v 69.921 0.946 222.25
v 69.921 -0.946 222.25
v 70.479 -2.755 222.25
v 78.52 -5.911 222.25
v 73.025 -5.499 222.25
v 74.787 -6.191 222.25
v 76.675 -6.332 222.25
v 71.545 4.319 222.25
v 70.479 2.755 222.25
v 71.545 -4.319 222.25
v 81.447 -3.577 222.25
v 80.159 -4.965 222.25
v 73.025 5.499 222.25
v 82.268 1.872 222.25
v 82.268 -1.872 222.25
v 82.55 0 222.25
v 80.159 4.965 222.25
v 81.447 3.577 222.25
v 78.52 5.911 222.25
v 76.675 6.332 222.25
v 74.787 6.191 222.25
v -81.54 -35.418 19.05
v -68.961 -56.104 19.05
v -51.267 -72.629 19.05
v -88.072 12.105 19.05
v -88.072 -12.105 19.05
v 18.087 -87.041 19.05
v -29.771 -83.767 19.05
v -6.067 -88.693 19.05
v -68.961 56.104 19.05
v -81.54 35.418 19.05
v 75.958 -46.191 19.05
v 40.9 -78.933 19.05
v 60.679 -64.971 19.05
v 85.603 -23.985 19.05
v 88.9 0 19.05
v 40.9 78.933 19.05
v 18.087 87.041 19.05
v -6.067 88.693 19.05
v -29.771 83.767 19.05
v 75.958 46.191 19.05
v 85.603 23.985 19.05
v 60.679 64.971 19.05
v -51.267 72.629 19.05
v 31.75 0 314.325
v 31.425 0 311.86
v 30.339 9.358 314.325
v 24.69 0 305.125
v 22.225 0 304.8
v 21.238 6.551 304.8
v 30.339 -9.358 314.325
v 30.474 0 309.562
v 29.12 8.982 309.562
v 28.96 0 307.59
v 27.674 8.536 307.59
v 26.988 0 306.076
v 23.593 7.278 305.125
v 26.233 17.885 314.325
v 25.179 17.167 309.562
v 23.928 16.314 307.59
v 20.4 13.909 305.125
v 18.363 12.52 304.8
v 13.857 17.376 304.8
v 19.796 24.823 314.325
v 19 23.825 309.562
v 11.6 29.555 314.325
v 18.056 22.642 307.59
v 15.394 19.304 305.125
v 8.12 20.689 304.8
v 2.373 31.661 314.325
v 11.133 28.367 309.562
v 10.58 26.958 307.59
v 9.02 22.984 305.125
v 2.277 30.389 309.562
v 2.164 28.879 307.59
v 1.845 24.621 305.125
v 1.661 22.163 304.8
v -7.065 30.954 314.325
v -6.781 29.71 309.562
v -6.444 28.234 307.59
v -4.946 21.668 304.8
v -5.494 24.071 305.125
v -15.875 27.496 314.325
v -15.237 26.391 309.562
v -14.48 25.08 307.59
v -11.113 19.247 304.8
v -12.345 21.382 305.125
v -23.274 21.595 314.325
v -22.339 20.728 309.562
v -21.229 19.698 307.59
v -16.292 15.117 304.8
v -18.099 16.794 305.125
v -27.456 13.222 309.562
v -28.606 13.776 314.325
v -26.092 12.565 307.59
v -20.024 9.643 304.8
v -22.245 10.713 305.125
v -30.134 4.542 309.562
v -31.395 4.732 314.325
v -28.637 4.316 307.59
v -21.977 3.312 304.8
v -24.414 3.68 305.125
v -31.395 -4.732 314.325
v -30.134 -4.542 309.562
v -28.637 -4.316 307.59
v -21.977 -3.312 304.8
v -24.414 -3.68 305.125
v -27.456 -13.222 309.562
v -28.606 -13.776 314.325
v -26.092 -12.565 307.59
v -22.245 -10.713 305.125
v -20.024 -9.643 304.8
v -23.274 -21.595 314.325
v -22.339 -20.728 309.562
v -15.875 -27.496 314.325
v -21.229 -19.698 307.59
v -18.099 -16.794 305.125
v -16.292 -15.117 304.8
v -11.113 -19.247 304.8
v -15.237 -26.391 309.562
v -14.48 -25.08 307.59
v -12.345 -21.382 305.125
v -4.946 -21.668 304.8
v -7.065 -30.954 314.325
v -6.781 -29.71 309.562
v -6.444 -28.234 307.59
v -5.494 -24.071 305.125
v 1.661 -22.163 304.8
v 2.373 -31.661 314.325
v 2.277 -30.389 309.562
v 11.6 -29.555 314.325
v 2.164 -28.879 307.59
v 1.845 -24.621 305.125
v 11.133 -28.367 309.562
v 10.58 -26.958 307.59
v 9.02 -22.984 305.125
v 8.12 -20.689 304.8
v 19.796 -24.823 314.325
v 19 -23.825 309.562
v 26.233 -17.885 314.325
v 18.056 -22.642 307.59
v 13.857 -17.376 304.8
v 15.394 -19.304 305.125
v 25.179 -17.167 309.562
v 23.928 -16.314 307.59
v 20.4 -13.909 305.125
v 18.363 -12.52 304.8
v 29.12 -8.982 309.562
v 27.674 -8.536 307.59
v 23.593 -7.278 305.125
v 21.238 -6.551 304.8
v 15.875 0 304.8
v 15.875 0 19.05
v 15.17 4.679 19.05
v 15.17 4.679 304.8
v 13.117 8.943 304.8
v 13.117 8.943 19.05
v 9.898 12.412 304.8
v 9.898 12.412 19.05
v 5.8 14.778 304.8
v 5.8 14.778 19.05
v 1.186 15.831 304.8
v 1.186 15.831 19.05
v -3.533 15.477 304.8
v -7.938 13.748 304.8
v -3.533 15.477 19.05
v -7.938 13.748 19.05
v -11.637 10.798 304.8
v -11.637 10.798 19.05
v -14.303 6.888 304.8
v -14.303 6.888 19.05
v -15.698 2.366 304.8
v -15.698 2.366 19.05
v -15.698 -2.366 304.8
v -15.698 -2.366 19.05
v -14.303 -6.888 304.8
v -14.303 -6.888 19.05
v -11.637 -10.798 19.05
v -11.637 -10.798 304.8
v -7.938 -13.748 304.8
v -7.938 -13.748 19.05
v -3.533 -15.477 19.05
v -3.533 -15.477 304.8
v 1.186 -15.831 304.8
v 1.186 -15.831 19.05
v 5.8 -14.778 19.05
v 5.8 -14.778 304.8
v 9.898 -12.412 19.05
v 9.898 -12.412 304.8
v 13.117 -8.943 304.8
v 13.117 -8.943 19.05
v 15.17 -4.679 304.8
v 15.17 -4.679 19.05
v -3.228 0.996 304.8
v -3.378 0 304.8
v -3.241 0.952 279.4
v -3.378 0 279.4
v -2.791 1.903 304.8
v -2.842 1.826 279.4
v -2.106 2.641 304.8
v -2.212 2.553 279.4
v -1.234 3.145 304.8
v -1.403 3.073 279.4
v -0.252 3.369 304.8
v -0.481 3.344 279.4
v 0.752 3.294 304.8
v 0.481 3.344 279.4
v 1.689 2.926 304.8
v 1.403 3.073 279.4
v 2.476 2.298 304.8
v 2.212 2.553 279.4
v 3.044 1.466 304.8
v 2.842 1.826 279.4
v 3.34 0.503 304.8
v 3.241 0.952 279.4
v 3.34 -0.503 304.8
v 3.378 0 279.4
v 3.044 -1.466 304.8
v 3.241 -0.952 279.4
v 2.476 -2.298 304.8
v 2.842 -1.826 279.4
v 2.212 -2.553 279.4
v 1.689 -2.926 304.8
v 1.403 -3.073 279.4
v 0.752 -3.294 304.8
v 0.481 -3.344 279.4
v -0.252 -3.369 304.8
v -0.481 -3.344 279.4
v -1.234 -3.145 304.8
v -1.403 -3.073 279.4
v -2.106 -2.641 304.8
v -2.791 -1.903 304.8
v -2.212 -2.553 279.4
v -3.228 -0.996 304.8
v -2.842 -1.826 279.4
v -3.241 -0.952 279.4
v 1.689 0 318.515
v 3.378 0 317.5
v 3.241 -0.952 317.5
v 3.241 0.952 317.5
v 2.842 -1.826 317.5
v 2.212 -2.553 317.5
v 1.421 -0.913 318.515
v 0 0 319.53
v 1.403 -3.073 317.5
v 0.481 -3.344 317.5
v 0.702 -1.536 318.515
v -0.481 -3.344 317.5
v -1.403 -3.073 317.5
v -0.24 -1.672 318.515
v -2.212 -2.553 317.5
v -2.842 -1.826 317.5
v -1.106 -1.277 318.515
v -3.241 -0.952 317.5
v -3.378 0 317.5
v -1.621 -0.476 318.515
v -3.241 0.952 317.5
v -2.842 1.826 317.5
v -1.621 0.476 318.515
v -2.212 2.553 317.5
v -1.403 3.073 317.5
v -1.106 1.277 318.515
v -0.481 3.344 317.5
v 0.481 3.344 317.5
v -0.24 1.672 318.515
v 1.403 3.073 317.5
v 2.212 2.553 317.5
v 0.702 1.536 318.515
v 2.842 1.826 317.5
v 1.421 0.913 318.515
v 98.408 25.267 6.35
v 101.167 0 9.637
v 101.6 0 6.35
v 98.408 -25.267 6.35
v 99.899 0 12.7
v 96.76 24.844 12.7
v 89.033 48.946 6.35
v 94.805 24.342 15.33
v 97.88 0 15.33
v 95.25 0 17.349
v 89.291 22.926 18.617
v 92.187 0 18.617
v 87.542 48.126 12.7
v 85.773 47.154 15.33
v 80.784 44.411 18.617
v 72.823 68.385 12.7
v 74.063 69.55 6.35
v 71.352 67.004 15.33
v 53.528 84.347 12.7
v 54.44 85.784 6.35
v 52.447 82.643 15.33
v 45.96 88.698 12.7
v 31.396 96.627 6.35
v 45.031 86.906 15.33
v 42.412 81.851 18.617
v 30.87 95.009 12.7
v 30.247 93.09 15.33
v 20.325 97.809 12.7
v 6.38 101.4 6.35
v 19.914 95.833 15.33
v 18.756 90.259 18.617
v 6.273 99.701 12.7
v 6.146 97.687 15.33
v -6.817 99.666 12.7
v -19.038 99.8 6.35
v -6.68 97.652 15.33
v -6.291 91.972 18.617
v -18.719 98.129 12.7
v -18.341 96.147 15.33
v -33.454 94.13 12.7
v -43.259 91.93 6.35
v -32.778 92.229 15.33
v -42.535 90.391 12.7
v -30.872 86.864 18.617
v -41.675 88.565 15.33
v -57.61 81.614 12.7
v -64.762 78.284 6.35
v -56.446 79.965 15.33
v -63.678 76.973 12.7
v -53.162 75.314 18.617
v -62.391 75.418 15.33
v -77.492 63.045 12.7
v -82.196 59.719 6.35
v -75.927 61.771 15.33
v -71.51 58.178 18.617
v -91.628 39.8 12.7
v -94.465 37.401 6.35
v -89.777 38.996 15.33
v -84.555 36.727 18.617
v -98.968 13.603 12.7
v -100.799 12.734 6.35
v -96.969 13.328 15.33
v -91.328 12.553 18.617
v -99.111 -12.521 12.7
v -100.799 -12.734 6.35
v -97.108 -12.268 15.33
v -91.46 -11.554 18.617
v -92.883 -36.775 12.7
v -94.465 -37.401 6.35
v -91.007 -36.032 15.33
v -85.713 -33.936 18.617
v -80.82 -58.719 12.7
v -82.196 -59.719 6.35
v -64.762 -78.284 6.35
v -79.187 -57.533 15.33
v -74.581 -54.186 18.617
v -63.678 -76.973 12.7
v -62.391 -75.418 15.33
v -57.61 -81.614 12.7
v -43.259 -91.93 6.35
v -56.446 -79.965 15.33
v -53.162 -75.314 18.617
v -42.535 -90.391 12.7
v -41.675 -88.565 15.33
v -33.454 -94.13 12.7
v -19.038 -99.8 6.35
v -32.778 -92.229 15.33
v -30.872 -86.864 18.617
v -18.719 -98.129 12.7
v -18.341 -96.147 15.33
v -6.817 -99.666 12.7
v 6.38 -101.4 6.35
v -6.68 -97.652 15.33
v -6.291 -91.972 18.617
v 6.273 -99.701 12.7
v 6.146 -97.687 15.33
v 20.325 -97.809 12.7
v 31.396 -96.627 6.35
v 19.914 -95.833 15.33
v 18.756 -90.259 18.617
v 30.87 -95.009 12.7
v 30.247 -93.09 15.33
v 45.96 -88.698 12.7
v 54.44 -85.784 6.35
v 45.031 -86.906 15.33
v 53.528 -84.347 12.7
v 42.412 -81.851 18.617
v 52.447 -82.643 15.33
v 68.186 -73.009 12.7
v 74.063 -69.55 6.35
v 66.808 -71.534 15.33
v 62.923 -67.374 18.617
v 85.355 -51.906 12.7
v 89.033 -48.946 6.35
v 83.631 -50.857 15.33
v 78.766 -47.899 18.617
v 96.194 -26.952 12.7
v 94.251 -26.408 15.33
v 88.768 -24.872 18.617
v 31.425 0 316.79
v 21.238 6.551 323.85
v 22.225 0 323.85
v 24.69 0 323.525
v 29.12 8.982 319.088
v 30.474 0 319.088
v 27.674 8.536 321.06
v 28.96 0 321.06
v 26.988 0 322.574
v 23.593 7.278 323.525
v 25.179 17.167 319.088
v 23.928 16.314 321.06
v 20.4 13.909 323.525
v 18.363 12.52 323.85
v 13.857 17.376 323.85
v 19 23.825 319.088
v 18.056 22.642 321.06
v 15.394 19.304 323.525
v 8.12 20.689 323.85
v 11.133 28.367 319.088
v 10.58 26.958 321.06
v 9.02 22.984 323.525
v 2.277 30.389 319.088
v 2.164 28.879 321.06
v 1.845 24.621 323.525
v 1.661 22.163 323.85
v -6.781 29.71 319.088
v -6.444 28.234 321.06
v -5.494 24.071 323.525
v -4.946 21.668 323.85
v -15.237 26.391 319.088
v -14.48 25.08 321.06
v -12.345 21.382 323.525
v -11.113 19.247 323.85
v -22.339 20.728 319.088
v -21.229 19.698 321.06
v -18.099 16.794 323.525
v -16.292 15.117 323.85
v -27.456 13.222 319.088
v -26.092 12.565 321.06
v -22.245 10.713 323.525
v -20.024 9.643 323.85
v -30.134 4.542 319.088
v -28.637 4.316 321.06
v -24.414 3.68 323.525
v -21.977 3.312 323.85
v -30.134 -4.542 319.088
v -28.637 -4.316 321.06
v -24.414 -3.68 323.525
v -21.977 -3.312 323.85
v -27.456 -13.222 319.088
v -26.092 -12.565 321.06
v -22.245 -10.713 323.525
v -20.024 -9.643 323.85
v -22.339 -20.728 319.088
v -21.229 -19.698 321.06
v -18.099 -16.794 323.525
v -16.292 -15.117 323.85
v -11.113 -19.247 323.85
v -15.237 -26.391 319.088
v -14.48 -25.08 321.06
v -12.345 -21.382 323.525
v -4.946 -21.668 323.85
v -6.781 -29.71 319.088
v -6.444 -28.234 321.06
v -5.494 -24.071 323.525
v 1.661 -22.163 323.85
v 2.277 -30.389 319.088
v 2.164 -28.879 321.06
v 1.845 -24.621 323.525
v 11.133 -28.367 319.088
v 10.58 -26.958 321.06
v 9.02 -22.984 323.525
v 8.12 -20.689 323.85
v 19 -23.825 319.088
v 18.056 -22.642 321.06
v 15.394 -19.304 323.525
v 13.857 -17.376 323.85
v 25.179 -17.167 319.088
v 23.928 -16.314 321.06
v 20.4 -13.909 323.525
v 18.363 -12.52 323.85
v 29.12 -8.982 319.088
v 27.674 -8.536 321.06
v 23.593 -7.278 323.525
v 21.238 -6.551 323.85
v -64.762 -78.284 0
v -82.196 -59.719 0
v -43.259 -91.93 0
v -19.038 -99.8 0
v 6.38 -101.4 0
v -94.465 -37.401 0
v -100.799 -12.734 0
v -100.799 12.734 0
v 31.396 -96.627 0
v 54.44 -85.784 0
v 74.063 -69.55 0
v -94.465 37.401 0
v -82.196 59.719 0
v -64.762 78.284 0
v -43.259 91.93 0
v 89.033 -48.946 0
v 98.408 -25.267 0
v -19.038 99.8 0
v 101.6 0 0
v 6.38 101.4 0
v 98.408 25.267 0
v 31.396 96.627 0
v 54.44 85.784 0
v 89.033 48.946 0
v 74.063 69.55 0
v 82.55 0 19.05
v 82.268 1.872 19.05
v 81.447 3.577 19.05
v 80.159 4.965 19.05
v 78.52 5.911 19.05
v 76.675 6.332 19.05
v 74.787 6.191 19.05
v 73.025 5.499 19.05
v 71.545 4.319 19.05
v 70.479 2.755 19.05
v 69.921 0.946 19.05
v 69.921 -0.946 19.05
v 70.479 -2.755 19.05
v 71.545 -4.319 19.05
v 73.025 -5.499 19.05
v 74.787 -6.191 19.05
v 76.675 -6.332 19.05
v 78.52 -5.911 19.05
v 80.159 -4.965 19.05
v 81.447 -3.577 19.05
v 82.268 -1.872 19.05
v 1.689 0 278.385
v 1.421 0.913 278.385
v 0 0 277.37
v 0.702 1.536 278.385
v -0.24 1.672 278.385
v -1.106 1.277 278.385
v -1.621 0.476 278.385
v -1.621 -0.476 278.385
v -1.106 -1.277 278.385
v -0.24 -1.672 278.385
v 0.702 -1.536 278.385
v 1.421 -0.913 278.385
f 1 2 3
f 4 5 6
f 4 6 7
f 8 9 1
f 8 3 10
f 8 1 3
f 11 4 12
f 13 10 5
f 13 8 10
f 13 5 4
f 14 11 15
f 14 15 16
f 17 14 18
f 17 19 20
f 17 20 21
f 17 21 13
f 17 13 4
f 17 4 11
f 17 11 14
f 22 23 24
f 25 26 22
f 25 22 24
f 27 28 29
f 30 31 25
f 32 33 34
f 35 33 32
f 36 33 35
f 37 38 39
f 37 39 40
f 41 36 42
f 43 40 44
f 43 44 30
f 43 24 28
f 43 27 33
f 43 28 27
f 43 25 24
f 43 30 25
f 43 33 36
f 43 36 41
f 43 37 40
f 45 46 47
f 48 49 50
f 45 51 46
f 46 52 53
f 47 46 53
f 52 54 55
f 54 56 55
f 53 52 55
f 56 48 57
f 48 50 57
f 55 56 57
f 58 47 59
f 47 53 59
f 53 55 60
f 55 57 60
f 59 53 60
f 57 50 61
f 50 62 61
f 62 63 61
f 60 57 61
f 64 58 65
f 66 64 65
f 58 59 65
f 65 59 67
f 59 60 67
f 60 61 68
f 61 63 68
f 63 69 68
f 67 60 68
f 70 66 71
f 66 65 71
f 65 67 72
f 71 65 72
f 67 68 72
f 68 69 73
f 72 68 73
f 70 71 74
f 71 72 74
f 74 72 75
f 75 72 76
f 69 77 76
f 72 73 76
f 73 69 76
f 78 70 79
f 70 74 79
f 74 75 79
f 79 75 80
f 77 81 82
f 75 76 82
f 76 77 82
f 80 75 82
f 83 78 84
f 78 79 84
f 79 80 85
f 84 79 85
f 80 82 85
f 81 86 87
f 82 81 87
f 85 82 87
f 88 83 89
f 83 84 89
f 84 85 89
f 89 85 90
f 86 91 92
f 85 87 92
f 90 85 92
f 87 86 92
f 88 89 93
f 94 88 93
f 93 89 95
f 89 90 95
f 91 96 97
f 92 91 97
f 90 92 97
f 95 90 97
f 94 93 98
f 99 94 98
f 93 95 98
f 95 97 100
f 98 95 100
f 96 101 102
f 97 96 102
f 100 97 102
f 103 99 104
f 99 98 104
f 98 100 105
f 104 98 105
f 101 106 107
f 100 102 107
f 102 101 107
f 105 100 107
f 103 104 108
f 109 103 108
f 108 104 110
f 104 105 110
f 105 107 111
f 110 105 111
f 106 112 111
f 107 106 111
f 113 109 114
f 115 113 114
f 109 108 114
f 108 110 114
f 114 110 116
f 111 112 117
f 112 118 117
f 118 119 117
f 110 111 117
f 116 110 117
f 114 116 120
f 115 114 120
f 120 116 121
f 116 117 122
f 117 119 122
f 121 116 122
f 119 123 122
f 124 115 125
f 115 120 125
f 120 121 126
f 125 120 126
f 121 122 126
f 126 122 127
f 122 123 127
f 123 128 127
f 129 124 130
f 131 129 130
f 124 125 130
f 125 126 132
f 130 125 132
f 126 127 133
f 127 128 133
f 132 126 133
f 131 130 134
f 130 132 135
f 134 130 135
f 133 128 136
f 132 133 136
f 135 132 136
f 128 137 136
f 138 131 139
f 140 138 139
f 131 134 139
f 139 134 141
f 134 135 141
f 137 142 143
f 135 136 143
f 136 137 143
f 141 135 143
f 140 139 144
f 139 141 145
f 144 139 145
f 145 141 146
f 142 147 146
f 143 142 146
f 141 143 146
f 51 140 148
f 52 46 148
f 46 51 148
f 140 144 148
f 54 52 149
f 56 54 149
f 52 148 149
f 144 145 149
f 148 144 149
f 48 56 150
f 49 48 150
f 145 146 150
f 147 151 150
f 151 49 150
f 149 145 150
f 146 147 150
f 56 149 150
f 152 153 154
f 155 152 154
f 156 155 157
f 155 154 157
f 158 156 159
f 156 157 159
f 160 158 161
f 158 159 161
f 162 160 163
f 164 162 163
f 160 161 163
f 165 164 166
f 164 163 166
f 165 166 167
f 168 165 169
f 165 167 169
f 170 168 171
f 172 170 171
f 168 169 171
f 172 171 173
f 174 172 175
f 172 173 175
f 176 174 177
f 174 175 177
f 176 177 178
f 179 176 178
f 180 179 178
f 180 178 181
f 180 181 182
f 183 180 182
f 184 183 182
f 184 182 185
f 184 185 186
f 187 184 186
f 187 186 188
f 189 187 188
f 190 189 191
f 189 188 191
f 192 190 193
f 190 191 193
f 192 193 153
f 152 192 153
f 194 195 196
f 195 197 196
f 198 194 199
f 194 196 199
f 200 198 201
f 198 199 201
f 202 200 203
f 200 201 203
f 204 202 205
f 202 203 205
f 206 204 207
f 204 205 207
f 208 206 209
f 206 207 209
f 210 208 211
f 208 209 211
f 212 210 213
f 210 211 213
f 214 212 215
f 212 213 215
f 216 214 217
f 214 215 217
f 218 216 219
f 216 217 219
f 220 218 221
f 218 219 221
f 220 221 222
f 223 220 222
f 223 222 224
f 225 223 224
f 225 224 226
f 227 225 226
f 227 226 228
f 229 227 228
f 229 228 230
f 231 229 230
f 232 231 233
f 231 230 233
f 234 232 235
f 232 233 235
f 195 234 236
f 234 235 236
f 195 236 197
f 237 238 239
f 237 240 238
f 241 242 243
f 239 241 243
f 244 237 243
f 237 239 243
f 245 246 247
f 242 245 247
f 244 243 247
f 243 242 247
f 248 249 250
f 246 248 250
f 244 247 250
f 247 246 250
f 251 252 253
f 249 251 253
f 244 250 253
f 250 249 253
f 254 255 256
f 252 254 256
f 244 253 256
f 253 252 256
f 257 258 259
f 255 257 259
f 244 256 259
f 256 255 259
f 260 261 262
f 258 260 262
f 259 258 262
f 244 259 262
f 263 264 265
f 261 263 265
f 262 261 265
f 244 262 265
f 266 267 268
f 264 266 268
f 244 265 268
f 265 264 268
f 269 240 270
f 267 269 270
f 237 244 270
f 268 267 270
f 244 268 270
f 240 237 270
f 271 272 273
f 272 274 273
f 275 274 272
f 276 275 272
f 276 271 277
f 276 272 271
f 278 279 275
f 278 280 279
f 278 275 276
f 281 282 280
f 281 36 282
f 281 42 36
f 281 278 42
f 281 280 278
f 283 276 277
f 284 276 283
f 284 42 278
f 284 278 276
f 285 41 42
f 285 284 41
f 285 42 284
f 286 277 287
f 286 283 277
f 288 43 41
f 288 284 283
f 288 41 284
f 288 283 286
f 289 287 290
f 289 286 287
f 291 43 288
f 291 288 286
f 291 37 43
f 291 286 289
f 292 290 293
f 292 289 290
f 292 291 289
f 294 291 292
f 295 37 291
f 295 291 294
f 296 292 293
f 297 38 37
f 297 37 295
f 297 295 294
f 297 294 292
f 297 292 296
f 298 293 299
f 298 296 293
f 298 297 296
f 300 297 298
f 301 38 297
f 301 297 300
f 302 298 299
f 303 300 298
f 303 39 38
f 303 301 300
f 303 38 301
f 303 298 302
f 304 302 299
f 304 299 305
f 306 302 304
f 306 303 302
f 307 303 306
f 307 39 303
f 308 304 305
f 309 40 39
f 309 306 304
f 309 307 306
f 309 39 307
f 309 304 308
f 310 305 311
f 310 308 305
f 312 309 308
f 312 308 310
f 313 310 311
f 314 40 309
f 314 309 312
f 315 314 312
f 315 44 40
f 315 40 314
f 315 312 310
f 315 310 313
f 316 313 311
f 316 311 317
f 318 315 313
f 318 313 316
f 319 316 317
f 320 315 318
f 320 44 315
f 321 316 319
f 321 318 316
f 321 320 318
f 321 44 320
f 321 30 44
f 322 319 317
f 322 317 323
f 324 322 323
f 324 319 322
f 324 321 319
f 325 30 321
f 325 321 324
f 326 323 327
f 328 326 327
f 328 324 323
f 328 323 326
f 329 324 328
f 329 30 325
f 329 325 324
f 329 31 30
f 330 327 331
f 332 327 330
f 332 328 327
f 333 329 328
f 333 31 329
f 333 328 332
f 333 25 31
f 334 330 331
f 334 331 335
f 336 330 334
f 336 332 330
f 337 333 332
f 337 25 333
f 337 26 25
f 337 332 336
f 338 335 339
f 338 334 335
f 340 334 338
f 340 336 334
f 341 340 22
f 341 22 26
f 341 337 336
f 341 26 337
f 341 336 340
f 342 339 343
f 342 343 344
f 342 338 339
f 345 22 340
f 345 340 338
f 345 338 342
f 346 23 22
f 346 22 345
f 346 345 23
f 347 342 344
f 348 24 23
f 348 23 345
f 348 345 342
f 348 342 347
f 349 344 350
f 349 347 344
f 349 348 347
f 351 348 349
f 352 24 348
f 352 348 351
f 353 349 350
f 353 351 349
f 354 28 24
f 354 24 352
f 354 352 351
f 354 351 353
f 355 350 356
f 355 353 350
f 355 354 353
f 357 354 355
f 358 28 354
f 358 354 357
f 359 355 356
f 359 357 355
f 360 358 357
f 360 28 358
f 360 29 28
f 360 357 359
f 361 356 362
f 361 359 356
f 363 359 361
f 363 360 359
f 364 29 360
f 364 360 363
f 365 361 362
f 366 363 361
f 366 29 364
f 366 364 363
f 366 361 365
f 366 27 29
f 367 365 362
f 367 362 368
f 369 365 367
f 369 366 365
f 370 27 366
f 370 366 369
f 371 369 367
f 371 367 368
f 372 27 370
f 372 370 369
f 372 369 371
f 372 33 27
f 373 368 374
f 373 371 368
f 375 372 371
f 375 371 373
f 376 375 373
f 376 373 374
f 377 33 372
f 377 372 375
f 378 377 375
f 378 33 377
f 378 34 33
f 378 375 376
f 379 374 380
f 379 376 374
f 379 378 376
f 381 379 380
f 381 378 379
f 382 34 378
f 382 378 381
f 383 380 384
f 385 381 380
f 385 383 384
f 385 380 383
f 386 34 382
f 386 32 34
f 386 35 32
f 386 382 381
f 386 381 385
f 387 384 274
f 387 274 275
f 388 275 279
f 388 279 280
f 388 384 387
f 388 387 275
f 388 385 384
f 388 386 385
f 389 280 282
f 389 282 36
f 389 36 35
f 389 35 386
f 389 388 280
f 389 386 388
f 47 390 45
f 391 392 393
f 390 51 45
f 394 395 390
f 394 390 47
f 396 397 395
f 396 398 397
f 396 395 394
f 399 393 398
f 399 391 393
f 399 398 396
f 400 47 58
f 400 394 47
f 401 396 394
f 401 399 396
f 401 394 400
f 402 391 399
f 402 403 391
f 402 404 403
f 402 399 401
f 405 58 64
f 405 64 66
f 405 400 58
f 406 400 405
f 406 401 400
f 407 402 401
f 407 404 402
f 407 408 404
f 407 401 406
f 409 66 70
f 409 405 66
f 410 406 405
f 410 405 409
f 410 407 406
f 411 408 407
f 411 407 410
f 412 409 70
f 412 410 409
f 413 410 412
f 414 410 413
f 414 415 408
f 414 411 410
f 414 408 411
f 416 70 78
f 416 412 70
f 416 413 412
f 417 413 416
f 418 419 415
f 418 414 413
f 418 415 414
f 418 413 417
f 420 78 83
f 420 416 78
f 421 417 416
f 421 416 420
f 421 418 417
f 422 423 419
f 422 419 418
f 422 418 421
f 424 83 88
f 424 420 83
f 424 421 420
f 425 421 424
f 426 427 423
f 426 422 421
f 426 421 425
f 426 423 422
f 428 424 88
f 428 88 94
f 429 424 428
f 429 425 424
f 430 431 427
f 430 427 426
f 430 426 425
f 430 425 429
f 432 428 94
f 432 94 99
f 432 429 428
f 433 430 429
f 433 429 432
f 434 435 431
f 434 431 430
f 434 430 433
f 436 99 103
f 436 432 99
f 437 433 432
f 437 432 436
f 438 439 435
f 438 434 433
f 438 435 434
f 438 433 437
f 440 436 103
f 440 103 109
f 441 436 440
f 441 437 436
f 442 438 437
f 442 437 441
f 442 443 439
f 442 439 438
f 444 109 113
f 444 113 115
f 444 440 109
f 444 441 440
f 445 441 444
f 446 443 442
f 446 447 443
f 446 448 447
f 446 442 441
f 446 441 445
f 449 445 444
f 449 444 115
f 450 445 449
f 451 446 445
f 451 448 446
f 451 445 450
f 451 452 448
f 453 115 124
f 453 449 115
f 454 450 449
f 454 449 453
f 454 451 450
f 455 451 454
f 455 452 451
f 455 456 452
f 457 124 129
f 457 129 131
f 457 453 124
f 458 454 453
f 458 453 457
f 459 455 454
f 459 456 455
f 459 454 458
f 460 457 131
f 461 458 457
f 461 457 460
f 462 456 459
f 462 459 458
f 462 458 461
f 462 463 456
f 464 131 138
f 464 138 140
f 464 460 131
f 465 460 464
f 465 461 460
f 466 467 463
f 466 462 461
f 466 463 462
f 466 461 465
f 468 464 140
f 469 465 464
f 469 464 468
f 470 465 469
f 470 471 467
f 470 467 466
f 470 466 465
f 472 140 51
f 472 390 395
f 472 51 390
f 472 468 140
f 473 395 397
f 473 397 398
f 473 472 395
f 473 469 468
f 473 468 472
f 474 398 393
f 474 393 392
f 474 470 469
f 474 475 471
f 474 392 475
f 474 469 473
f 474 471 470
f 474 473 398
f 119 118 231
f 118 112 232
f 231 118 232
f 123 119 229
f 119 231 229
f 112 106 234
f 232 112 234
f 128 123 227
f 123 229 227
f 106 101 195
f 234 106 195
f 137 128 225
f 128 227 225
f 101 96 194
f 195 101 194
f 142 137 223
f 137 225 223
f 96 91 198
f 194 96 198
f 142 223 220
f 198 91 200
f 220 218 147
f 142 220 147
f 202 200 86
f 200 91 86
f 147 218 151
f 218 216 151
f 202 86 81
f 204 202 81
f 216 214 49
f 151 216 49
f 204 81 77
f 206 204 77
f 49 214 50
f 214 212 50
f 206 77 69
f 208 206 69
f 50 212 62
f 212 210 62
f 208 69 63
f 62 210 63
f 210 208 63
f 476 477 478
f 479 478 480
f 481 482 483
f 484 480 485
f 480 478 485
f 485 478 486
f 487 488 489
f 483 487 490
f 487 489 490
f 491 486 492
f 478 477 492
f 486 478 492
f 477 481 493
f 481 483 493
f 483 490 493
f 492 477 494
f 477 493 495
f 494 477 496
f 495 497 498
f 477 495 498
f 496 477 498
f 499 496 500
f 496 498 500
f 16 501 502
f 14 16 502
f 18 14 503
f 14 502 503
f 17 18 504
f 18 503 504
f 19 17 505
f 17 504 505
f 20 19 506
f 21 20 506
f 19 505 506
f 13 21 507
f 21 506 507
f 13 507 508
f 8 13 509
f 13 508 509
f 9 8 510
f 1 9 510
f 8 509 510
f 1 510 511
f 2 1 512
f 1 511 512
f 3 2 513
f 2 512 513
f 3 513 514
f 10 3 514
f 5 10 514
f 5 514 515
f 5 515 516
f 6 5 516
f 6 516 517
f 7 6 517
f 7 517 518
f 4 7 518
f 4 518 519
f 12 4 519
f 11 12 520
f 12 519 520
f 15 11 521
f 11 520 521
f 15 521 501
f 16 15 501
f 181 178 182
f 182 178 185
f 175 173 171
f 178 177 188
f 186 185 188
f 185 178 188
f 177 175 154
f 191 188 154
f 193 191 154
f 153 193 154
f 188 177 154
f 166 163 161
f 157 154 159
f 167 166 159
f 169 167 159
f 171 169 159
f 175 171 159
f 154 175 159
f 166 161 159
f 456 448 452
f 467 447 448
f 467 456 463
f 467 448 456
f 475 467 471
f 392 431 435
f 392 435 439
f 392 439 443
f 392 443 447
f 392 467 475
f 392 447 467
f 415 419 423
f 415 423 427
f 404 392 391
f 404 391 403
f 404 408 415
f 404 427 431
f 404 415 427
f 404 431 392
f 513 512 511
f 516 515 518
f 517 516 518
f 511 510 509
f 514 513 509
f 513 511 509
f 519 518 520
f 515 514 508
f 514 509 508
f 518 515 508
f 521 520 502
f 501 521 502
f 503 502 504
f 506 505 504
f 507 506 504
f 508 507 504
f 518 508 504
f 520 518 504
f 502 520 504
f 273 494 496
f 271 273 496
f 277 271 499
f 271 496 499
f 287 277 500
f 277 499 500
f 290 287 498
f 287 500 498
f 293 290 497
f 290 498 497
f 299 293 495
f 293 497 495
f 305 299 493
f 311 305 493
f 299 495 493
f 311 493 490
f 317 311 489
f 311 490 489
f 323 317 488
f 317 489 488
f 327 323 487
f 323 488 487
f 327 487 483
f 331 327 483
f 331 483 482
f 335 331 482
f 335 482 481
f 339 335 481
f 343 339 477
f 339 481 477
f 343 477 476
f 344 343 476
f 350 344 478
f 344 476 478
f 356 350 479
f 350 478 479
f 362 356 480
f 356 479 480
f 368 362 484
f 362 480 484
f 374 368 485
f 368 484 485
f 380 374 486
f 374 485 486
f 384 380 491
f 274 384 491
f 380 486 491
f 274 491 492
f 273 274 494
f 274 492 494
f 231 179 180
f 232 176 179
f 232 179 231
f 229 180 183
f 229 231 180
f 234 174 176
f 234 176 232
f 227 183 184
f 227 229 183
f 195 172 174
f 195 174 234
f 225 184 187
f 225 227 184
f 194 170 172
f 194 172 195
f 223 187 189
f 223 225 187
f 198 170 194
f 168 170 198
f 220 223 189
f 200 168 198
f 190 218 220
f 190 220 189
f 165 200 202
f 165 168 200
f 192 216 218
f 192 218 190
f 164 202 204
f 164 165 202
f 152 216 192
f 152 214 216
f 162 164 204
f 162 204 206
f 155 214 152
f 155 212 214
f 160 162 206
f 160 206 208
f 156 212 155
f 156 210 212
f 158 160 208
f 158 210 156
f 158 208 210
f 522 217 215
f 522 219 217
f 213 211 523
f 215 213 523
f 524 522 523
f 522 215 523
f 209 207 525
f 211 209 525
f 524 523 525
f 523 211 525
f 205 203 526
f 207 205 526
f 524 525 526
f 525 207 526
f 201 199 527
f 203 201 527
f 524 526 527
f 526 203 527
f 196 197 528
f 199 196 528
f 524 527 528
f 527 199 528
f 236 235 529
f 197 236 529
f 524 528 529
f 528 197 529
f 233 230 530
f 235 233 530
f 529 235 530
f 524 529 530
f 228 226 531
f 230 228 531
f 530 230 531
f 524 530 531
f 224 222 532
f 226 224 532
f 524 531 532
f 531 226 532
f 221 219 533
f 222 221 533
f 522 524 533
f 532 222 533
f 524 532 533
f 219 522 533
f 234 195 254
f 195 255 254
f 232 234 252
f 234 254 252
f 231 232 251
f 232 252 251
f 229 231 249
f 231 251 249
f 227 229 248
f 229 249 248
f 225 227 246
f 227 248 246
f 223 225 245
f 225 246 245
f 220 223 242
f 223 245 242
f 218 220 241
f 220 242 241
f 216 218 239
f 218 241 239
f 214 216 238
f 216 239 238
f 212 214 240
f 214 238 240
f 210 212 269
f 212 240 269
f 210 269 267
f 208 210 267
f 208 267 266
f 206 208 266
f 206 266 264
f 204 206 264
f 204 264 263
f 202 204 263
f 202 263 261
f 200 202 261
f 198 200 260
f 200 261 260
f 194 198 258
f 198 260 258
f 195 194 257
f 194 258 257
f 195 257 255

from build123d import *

# Parameters (mm, degrees)
F0_R      = 101.6
F1_DEPTH  = 19.05
F2_R      = 12.7
F3_R      = 15.875
F4_DEPTH  = 285.75
F3_R_2    = 6.35
F5_DEPTH  = 203.2
F6_R      = 31.75
F7_DEPTH  = 19.05
F8_R      = 9.52499
F9_D      = 6.7564
F9_DEPTH  = 25.4
F9_TIP    = 2.0298273432
F10_D     = 6.7564
F10_DEPTH = 12.7
F10_TIP   = 2.0298273432


# Not quite as in the source:
# - a fillet or chamfer is up to 0.001 mm smaller than in the source, because OpenCascade refuses the exact size


with BuildPart() as f1:
    # F0 (on Top) → F1 (new body)
    with BuildSketch(Plane.XY):
        Circle(F0_R)
    extrude(amount=F1_DEPTH)

    # F2
    f2_edges = [f1.edges().sort_by_distance(p)[0] for p in [
        (-101.6, 0, 19.05),
    ]]
    fillet(f2_edges, radius=F2_R)


with BuildPart() as f4:
    # F3 (on face) → F4 (new body)
    with BuildSketch(Plane.XY.offset(19.05)):
        Circle(F3_R)
    extrude(amount=F4_DEPTH)

    # F9
    with Locations(Plane.XY.offset(304.8)):
        with Locations((0, 0)):
            Hole(F9_D / 2, depth=F9_DEPTH)
            with Locations((0, 0, -(F9_DEPTH + F9_TIP / 2))):  # 118° drill point
                Cone(0, F9_D / 2, F9_TIP, mode=Mode.SUBTRACT)


with BuildPart() as f5:
    # F3 (on face) → F5 (new body)
    with BuildSketch(Plane.XY.offset(19.05)):
        with Locations((76.2, 0)):
            Circle(F3_R_2)
    extrude(amount=F5_DEPTH)


with BuildPart() as f7:
    # F6 (on face) → F7 (new body)
    with BuildSketch(Plane.XY.offset(304.8)):
        Circle(F6_R)
    extrude(amount=F7_DEPTH)

    # F8 (radius 9.525 in the source; OpenCascade refuses exactly that, so slightly less here)
    f8_edges = [f7.edges().sort_by_distance(p)[0] for p in [
        (-31.75, 0, 323.85),
        (-31.75, 0, 304.8),
    ]]
    fillet(f8_edges, radius=F8_R)

    # F10
    with Locations(Plane(origin=(0, 0, 304.8), x_dir=(1, 0, 0), z_dir=(0, 0, -1))):
        with Locations((0, 0)):
            Hole(F10_D / 2, depth=F10_DEPTH)
            with Locations((0, 0, -(F10_DEPTH + F10_TIP / 2))):  # 118° drill point
                Cone(0, F10_D / 2, F10_TIP, mode=Mode.SUBTRACT)


solid = Compound([f1.part, f4.part, f5.part, f7.part])
